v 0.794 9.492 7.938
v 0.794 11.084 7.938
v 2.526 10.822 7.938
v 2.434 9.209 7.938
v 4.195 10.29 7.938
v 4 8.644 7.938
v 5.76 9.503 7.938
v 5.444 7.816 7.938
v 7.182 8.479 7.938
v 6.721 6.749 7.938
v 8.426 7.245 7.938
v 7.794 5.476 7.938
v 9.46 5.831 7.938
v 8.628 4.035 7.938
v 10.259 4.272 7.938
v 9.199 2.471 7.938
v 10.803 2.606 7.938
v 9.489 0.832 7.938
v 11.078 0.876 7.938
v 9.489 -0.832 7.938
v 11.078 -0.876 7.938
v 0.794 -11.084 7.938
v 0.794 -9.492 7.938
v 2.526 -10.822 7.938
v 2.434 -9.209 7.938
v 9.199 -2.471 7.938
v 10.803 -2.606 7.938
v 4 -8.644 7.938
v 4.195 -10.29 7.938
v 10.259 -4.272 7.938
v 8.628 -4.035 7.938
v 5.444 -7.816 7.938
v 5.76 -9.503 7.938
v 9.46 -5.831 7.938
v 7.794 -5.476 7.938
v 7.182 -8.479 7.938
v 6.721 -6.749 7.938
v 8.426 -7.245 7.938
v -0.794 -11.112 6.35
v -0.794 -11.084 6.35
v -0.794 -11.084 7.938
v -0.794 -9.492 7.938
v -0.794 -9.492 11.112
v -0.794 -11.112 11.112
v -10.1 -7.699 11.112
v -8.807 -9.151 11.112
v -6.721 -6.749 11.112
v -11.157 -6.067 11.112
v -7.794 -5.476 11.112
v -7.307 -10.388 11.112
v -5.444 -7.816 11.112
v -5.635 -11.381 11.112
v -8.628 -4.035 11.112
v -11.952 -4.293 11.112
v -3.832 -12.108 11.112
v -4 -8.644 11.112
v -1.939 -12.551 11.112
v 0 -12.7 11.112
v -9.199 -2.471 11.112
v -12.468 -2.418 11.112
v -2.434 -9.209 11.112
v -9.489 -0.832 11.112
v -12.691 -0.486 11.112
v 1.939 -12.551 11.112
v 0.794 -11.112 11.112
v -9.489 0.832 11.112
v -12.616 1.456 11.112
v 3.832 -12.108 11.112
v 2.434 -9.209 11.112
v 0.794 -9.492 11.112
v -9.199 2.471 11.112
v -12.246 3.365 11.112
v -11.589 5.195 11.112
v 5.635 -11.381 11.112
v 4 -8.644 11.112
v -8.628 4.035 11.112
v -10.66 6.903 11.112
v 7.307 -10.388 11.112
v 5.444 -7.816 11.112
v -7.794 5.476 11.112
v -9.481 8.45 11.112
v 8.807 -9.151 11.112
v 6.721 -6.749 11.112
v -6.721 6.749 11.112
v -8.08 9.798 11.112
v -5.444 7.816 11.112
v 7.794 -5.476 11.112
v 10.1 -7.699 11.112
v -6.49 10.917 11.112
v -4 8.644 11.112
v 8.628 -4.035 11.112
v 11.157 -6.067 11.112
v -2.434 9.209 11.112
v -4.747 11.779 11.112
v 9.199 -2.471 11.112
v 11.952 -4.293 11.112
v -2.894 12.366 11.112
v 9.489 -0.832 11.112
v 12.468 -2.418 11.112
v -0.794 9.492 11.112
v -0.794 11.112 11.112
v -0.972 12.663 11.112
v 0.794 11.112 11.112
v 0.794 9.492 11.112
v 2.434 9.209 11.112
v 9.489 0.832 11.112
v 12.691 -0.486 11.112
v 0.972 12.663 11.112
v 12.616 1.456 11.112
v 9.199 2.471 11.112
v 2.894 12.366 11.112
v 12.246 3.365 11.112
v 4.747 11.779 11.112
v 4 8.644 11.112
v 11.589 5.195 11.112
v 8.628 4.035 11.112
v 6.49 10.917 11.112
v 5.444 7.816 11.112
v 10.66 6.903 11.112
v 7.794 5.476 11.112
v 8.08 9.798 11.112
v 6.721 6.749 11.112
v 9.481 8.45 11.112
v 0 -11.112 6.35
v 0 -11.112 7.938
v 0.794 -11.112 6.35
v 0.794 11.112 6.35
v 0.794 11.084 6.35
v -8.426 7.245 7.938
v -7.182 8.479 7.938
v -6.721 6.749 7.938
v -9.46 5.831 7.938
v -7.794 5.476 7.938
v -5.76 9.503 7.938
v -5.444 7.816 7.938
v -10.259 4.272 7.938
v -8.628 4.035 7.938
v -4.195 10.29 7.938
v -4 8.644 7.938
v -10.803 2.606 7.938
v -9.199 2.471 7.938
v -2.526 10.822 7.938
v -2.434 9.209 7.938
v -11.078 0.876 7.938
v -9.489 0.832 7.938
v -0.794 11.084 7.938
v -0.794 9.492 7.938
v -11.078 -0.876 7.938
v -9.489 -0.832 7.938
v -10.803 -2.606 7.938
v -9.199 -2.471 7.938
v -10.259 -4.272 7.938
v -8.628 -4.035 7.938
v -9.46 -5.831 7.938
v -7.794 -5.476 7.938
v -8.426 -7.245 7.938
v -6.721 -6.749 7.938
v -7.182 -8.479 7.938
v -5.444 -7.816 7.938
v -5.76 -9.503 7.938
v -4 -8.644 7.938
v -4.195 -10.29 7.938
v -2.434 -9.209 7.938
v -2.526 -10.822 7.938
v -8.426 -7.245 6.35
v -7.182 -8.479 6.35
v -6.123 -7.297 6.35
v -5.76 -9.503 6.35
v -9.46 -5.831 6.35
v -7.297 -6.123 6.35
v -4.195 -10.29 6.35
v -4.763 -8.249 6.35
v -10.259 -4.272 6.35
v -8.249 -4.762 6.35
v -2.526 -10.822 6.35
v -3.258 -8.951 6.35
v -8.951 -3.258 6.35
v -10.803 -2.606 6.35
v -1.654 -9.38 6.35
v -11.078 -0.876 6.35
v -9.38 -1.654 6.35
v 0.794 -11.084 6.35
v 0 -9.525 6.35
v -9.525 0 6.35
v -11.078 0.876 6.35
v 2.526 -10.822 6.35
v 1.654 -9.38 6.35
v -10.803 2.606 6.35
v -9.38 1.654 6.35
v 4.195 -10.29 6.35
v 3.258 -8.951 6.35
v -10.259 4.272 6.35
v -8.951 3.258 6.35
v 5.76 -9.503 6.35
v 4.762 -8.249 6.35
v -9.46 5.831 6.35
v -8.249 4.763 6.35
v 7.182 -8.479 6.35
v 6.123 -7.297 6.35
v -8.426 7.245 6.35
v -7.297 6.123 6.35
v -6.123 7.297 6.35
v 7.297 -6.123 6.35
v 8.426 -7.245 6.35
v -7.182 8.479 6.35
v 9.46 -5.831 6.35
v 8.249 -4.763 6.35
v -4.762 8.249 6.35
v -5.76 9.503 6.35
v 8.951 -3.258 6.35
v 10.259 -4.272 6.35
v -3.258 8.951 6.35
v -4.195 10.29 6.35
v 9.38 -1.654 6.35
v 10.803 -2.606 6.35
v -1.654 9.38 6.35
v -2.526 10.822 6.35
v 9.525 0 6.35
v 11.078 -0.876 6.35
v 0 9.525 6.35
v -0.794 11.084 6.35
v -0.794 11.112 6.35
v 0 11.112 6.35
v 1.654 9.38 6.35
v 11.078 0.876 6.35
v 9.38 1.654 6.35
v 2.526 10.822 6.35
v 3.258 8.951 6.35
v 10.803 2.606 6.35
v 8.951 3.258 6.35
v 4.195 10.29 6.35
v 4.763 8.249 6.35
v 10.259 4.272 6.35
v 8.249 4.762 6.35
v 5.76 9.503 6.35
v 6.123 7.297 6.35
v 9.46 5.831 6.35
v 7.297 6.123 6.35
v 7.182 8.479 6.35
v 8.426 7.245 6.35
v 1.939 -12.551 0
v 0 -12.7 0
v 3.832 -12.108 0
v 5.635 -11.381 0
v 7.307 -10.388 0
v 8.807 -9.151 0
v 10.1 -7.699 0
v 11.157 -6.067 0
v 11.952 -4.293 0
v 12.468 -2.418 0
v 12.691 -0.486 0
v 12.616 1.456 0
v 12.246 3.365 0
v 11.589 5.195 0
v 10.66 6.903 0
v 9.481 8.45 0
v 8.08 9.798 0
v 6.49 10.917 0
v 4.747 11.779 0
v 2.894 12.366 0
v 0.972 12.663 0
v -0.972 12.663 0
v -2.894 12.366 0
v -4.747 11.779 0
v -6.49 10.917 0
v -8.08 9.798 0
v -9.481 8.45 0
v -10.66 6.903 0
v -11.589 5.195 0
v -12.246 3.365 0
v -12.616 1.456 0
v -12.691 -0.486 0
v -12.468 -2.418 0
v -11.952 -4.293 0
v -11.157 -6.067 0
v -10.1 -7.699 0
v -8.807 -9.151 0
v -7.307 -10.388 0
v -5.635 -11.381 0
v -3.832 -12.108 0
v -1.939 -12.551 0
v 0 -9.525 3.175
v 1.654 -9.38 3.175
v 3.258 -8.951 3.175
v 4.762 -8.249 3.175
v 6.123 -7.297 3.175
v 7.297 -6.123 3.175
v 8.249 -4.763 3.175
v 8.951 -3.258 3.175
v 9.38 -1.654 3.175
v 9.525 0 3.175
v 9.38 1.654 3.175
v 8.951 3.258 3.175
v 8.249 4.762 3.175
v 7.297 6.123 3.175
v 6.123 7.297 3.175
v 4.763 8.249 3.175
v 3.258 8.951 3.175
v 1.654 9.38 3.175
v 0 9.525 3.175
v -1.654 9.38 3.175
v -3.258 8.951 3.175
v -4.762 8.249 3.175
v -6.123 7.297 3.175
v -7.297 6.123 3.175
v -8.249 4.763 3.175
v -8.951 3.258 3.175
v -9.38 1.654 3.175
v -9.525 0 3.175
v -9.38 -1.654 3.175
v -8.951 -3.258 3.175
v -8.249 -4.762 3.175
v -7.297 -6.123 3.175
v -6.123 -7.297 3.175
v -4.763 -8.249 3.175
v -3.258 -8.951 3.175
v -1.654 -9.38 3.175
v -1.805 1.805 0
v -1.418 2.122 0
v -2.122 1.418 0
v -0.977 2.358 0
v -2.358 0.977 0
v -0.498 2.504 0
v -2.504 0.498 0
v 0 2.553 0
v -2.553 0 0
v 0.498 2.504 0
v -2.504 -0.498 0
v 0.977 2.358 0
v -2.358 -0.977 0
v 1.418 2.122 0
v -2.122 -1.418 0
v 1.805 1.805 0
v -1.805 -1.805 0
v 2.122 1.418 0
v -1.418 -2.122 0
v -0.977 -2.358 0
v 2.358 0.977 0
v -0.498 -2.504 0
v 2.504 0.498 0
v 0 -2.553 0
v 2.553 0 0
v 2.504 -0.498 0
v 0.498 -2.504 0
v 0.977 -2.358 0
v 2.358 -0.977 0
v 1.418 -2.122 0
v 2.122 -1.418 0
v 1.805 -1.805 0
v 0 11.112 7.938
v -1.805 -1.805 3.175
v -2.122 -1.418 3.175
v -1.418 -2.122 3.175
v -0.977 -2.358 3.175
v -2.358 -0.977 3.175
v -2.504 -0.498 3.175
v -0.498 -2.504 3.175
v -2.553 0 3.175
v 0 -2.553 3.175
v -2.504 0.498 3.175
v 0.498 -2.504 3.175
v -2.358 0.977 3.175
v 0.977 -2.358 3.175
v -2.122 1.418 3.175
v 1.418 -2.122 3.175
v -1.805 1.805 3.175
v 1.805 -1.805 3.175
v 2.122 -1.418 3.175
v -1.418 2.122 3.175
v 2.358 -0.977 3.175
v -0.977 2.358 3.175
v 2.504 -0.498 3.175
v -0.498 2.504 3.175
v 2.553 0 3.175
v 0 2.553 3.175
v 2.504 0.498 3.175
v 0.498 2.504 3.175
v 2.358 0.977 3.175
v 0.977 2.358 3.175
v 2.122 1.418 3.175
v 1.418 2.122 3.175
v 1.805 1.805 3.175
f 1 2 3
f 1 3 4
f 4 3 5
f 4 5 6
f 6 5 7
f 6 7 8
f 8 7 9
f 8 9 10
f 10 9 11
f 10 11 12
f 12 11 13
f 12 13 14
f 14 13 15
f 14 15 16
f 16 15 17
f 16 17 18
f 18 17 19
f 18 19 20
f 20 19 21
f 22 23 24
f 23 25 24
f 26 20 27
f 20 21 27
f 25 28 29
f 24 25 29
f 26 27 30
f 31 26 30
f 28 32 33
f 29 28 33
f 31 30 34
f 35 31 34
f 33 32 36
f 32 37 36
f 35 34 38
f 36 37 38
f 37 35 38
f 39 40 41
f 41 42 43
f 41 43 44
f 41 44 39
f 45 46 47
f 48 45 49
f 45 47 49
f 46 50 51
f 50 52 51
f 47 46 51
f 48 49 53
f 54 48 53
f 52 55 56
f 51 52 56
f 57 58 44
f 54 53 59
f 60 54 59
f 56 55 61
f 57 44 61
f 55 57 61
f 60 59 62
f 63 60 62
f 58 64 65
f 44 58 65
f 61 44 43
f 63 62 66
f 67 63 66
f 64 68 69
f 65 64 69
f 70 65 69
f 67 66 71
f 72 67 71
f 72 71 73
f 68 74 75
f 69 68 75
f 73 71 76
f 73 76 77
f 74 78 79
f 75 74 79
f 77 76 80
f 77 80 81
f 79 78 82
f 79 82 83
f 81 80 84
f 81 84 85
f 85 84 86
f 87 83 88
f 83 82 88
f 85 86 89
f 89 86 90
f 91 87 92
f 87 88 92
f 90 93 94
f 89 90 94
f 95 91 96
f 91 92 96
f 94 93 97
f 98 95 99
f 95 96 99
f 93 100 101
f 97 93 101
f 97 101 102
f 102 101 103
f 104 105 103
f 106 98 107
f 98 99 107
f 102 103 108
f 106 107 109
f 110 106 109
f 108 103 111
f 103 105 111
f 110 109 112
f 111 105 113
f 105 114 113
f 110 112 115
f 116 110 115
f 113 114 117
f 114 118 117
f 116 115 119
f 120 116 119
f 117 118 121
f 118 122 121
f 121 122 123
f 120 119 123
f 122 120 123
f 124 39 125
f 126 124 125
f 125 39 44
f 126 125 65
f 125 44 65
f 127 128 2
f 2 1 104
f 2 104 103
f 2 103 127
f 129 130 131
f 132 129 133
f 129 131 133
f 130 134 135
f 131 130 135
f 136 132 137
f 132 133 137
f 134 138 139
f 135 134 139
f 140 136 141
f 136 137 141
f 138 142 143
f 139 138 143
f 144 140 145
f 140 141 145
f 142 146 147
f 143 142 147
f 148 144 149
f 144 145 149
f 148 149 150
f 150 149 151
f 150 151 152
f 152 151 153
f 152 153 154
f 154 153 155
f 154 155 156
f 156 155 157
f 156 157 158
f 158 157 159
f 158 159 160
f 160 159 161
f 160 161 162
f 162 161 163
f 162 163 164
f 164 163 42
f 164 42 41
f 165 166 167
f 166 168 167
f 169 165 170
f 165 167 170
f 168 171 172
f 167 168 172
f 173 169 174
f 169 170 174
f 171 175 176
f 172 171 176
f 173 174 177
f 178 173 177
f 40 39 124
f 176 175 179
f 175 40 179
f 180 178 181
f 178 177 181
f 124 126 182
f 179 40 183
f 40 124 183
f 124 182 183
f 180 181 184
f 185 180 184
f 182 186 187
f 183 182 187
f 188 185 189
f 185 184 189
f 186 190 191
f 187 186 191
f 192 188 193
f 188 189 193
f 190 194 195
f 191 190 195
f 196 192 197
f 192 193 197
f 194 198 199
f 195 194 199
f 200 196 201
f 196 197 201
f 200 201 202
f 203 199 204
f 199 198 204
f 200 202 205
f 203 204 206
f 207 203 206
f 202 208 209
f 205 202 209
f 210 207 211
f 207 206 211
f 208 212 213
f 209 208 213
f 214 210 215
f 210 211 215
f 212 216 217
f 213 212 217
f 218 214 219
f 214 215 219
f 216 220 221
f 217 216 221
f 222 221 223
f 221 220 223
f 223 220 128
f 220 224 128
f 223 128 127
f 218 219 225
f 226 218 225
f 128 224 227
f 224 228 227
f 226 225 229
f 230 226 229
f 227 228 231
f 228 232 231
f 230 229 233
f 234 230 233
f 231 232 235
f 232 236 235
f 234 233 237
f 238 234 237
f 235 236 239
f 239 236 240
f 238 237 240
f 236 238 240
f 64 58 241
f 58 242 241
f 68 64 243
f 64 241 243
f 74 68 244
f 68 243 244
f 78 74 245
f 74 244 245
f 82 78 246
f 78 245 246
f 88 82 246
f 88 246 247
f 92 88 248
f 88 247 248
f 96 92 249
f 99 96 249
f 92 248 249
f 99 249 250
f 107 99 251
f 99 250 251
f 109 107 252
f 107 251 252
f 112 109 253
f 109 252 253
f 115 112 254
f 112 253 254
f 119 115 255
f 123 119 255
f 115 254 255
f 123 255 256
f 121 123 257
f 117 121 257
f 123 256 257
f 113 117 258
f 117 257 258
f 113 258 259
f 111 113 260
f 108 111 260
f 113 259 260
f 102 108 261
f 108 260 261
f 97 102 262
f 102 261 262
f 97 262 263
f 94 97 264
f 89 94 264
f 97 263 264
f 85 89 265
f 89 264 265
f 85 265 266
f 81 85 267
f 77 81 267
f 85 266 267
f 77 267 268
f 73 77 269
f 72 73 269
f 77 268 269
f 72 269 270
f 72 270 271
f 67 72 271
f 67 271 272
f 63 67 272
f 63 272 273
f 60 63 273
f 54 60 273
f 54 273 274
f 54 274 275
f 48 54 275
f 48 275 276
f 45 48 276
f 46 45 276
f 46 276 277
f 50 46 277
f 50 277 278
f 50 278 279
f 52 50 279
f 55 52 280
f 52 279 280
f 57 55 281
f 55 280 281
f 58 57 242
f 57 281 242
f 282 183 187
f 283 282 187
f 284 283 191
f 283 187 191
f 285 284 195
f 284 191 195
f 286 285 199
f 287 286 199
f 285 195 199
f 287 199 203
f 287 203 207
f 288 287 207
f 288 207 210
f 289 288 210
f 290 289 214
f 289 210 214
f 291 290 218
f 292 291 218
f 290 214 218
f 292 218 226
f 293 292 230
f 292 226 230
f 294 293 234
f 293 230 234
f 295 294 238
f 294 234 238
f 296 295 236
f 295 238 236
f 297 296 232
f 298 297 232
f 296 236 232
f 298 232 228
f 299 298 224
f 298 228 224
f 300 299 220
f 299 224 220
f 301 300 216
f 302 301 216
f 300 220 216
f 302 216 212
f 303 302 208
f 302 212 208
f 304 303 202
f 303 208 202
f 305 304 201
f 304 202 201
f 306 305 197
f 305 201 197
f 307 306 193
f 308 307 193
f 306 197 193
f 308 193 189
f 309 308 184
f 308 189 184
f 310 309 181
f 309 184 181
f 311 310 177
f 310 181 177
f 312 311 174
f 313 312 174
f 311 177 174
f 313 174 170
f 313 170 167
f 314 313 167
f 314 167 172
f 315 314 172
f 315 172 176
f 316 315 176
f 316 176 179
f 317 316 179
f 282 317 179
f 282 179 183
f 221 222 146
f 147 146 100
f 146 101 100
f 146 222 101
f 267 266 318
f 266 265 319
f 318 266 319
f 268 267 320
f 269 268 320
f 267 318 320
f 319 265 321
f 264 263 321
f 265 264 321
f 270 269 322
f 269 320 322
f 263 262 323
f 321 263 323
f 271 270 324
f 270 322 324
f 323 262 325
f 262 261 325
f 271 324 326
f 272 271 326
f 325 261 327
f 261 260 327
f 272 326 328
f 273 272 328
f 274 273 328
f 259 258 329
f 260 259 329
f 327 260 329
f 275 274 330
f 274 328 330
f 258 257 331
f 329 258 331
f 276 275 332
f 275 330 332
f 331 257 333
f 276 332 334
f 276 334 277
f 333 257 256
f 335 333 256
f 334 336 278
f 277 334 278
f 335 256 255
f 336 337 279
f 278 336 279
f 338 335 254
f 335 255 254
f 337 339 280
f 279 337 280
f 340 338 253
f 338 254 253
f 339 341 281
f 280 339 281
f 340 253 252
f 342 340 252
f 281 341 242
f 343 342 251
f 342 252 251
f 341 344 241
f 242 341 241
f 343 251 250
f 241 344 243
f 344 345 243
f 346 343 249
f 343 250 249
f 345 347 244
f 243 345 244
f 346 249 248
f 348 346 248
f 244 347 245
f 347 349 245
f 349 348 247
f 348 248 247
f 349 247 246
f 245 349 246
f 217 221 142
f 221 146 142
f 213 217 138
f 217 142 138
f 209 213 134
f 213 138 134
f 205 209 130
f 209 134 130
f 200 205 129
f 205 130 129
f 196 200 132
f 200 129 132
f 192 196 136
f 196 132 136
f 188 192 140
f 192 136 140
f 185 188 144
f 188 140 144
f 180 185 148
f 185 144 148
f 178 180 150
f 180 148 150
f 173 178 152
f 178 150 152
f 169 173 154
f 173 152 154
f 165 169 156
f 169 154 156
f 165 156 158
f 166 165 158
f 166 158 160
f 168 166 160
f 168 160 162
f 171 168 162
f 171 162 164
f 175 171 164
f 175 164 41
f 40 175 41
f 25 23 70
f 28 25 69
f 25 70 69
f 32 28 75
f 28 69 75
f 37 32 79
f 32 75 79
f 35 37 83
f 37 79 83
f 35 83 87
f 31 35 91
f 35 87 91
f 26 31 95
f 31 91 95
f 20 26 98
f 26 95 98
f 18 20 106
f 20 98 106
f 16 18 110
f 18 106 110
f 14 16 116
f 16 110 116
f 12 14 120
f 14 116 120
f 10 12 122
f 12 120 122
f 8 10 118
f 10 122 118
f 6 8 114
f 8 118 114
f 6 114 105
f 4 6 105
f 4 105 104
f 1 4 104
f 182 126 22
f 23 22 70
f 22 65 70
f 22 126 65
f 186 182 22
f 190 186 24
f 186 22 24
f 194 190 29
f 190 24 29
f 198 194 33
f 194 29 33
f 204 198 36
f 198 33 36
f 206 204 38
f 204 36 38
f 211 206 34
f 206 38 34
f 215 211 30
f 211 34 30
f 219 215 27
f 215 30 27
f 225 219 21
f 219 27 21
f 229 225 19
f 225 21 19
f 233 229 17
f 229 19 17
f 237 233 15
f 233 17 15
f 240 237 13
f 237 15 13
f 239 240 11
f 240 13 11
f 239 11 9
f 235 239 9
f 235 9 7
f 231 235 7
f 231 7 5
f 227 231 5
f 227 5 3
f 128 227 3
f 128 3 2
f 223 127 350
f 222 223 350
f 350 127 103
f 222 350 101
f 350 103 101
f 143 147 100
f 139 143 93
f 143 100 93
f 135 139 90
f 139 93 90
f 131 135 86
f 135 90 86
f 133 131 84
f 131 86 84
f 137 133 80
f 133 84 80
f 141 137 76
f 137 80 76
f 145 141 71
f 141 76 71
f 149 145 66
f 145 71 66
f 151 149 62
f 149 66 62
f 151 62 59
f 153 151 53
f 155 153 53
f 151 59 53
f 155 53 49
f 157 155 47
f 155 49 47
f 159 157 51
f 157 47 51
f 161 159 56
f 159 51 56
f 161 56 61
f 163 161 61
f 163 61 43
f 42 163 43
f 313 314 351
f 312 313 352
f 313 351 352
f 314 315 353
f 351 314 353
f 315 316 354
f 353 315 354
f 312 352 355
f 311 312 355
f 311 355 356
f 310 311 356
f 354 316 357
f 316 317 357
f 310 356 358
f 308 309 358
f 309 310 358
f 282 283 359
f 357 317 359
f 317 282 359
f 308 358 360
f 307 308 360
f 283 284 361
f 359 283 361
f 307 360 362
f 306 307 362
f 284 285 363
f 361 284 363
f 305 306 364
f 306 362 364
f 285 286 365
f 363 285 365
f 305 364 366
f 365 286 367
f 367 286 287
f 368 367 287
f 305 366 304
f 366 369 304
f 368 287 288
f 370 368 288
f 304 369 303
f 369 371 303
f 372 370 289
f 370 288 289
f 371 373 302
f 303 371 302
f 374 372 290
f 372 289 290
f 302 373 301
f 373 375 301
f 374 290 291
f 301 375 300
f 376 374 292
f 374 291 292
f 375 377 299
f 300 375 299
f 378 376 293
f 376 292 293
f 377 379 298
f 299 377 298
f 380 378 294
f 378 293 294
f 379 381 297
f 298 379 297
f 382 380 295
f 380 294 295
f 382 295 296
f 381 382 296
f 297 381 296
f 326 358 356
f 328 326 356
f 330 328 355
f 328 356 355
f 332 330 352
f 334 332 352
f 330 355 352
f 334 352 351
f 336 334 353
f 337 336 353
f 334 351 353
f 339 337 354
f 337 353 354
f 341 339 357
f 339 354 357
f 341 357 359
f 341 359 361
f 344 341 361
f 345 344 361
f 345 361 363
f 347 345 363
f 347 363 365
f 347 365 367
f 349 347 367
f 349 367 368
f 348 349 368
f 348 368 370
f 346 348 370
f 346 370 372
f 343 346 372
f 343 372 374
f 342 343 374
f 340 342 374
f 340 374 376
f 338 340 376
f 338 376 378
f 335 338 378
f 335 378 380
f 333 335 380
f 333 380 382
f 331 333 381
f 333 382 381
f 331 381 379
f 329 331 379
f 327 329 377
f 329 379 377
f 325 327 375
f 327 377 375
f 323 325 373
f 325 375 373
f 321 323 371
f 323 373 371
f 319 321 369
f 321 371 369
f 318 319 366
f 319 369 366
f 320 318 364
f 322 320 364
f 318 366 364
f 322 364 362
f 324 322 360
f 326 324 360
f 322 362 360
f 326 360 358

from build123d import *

# Parameters (mm, degrees)
F3_DEPTH = 4.7625
F5_D     = 5.1054


with BuildPart() as f1:
    # F0 (on Right) → F1 (revolve)
    with BuildSketch(Plane.YZ):
        Polygon((-9.525, 0), (0, 0), (0, 3.175), (-9.525, 3.175), (-9.525, 6.35), (-11.1125, 6.35), (-11.1125, 7.9375), (-9.525, 7.9375), (-9.525, 11.1125), (-12.7, 11.1125), (-12.7, 7.9375), (-12.7, 6.35), (-12.7, 0), align=None)
    revolve(axis=Axis((0, 0, 5.3960988298), (0, 0, 1)))

    # F2 (on face) → F3 (cut)
    with BuildSketch(Plane.XY.offset(11.1125)):
        Polygon((0, 9.4918694648), (0.79375, 9.4918694648), (0.79375, 11.1125), (0, 11.1125), (-0.79375, 11.1125), (-0.79375, 9.4918694648), align=None)
        Polygon((0.79375, -11.1125), (0.79375, -9.4918694648), (0, -9.4918694648), (-0.79375, -9.4918694648), (-0.79375, -11.1125), (0, -11.1125), align=None)
    extrude(amount=-F3_DEPTH, mode=Mode.SUBTRACT)

    # F5 (through all)
    with Locations(Plane(origin=(0, 0, 0), x_dir=(1, 0, 0), z_dir=(0, 0, -1))):
        with Locations((0, 0)):
            Hole(F5_D / 2)


solid = f1.part
